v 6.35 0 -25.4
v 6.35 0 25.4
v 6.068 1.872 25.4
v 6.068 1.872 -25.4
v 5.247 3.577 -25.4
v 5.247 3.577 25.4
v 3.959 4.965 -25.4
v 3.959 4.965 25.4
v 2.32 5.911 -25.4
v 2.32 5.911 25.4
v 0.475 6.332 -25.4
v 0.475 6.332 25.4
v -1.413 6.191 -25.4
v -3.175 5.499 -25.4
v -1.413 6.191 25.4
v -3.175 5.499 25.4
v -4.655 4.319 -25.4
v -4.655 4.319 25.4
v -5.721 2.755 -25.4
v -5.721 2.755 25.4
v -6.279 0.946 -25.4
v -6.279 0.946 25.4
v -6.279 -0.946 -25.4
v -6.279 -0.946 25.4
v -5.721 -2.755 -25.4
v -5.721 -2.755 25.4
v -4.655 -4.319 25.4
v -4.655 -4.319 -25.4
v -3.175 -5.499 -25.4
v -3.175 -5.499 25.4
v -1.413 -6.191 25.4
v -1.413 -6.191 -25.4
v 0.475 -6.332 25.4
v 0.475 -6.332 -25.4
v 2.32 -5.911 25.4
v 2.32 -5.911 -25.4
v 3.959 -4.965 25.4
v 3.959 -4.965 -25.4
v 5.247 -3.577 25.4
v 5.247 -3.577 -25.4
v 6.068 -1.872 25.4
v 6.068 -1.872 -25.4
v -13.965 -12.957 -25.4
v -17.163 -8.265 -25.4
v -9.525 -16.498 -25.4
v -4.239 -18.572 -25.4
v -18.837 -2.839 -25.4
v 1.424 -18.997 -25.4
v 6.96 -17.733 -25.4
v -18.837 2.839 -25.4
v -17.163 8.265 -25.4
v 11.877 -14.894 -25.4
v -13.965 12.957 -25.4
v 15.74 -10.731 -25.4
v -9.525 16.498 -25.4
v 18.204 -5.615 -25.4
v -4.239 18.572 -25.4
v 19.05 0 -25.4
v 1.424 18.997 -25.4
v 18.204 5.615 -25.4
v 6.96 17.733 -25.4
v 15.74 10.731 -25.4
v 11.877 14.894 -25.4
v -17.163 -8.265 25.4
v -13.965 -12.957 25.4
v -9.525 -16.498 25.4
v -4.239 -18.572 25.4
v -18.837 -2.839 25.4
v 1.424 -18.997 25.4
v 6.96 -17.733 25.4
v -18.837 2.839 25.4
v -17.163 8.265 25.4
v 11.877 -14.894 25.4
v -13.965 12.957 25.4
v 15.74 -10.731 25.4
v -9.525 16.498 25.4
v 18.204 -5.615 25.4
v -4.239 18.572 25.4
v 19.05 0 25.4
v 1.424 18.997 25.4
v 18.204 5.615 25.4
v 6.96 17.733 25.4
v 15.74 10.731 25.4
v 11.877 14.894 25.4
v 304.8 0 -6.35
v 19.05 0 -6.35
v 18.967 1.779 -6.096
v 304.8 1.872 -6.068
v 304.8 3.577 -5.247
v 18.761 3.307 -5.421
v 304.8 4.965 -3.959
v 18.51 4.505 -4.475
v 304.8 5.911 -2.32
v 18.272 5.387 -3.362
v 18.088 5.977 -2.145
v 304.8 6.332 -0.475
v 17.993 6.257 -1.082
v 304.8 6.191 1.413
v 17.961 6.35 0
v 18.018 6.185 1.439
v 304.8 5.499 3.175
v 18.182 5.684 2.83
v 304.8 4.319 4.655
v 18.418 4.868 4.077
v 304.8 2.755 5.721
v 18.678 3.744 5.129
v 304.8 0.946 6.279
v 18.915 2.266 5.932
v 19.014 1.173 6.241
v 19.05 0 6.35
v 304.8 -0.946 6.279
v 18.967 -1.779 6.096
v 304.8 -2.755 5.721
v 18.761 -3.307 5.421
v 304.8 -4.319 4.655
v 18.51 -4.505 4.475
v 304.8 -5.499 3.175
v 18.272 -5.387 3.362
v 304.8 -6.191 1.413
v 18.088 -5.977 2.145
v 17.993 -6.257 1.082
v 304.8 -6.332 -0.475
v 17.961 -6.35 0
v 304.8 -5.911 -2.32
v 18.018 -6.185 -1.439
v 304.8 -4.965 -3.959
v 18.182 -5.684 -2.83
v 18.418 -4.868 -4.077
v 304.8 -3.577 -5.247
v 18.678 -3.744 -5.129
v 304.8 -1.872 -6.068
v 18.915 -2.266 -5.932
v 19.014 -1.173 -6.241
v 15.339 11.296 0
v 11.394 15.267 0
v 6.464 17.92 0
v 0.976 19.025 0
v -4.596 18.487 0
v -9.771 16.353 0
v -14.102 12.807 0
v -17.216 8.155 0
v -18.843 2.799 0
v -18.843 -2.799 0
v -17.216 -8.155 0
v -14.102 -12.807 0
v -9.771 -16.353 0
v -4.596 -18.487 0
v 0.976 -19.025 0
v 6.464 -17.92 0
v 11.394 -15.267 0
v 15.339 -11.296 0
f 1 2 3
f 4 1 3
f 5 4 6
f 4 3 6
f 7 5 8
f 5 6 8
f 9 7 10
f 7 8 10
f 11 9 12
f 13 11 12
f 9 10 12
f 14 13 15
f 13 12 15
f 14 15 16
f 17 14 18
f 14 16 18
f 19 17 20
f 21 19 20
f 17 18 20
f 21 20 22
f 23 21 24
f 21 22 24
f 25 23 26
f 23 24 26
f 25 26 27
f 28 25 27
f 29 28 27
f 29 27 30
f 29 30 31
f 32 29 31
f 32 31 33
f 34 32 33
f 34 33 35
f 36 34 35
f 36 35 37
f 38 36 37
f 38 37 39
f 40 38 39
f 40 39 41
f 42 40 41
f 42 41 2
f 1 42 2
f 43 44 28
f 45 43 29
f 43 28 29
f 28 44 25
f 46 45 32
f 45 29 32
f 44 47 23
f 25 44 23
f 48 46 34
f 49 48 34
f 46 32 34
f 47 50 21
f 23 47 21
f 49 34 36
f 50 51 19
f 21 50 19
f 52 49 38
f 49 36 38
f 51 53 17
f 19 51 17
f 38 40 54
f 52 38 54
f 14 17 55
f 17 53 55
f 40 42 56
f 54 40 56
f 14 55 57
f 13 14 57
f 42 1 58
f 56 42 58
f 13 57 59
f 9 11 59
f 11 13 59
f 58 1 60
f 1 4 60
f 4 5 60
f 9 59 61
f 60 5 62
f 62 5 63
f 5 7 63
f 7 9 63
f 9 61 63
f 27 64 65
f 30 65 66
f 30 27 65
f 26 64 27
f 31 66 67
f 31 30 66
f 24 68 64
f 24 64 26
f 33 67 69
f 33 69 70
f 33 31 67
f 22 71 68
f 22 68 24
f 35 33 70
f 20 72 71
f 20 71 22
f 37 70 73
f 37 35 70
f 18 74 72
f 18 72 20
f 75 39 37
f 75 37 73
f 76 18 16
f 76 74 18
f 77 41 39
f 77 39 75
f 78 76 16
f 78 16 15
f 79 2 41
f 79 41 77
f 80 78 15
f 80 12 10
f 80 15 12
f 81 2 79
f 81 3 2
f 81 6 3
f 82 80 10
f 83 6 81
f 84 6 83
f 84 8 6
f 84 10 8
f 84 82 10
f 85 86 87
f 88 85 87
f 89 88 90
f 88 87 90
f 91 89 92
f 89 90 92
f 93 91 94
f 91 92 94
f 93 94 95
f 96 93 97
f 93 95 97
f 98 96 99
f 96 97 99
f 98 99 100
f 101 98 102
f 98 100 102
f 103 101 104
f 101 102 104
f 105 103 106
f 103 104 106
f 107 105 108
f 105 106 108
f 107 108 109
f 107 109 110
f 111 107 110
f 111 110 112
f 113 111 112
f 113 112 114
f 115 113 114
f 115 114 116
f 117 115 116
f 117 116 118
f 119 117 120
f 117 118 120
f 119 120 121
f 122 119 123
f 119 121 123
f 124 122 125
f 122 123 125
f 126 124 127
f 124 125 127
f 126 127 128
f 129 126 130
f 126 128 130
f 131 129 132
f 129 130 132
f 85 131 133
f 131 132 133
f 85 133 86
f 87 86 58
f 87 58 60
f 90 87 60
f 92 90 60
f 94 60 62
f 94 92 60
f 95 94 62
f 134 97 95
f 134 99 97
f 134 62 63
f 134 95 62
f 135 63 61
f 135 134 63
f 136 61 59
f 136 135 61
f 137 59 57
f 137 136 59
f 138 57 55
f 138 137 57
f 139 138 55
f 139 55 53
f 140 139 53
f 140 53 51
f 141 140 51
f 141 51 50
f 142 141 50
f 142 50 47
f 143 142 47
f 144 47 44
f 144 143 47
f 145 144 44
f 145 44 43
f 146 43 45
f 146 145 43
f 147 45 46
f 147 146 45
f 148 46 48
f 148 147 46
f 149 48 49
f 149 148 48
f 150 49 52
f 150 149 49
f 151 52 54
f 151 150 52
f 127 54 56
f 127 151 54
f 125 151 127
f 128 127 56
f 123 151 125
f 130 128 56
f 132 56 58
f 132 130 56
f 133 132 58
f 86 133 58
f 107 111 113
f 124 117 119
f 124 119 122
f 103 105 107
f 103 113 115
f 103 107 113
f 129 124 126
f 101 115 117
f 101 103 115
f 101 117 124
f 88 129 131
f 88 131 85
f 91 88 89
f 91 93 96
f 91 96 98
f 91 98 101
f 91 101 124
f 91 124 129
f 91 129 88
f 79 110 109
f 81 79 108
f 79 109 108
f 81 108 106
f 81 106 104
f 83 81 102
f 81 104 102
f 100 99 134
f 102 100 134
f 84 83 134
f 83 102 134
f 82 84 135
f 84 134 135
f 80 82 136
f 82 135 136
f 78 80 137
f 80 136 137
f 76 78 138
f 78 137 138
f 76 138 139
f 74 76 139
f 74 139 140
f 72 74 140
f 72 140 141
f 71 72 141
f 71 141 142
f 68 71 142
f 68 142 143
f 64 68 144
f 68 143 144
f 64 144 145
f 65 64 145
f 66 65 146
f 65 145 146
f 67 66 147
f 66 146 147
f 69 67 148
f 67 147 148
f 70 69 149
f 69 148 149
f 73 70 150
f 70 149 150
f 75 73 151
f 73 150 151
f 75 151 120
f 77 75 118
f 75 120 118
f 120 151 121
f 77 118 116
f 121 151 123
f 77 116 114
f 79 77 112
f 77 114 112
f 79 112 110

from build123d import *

# Parameters (mm, degrees)
SKETCH1_R                = 6.35
BOSS_EXTRUDE1_DEPTH      = 304.8
BOSS_EXTRUDE2_DEPTH      = 25.4
BOSS_EXTRUDE2_DEPTH_BACK = 25.4
SKETCH2_R                = 19.05
CUT_EXTRUDE1_REACH       = 311.591
SKETCH3_R                = 6.35


with BuildPart() as part:
    # Sketch1 → Boss-Extrude1 (new body)
    with BuildSketch(Plane(origin=(0, 0, 0), x_dir=(0, 0, -1), z_dir=(1, 0, 0))):
        Circle(SKETCH1_R)
    extrude(amount=BOSS_EXTRUDE1_DEPTH)

    # Sketch2 → Boss-Extrude2 (add, two sides: drawn at the far end of the back side and taken through both)
    with BuildSketch(Plane.XY.offset(-BOSS_EXTRUDE2_DEPTH_BACK)):
        Circle(SKETCH2_R)
    extrude(amount=BOSS_EXTRUDE2_DEPTH + BOSS_EXTRUDE2_DEPTH_BACK)

    # Sketch3 → Cut-Extrude1 (cut, up to next)
    with BuildSketch(Plane.XY.offset(25.4), mode=Mode.PRIVATE) as cut_extrude1_sk1:
        Circle(SKETCH3_R)
    cut_extrude1_tool1 = extrude(cut_extrude1_sk1.sketch, amount=-CUT_EXTRUDE1_REACH, mode=Mode.PRIVATE) & part.part
    add(cut_extrude1_tool1.solids().sort_by_distance((0, 0, 25.4))[0], mode=Mode.SUBTRACT)


solid = part.part
